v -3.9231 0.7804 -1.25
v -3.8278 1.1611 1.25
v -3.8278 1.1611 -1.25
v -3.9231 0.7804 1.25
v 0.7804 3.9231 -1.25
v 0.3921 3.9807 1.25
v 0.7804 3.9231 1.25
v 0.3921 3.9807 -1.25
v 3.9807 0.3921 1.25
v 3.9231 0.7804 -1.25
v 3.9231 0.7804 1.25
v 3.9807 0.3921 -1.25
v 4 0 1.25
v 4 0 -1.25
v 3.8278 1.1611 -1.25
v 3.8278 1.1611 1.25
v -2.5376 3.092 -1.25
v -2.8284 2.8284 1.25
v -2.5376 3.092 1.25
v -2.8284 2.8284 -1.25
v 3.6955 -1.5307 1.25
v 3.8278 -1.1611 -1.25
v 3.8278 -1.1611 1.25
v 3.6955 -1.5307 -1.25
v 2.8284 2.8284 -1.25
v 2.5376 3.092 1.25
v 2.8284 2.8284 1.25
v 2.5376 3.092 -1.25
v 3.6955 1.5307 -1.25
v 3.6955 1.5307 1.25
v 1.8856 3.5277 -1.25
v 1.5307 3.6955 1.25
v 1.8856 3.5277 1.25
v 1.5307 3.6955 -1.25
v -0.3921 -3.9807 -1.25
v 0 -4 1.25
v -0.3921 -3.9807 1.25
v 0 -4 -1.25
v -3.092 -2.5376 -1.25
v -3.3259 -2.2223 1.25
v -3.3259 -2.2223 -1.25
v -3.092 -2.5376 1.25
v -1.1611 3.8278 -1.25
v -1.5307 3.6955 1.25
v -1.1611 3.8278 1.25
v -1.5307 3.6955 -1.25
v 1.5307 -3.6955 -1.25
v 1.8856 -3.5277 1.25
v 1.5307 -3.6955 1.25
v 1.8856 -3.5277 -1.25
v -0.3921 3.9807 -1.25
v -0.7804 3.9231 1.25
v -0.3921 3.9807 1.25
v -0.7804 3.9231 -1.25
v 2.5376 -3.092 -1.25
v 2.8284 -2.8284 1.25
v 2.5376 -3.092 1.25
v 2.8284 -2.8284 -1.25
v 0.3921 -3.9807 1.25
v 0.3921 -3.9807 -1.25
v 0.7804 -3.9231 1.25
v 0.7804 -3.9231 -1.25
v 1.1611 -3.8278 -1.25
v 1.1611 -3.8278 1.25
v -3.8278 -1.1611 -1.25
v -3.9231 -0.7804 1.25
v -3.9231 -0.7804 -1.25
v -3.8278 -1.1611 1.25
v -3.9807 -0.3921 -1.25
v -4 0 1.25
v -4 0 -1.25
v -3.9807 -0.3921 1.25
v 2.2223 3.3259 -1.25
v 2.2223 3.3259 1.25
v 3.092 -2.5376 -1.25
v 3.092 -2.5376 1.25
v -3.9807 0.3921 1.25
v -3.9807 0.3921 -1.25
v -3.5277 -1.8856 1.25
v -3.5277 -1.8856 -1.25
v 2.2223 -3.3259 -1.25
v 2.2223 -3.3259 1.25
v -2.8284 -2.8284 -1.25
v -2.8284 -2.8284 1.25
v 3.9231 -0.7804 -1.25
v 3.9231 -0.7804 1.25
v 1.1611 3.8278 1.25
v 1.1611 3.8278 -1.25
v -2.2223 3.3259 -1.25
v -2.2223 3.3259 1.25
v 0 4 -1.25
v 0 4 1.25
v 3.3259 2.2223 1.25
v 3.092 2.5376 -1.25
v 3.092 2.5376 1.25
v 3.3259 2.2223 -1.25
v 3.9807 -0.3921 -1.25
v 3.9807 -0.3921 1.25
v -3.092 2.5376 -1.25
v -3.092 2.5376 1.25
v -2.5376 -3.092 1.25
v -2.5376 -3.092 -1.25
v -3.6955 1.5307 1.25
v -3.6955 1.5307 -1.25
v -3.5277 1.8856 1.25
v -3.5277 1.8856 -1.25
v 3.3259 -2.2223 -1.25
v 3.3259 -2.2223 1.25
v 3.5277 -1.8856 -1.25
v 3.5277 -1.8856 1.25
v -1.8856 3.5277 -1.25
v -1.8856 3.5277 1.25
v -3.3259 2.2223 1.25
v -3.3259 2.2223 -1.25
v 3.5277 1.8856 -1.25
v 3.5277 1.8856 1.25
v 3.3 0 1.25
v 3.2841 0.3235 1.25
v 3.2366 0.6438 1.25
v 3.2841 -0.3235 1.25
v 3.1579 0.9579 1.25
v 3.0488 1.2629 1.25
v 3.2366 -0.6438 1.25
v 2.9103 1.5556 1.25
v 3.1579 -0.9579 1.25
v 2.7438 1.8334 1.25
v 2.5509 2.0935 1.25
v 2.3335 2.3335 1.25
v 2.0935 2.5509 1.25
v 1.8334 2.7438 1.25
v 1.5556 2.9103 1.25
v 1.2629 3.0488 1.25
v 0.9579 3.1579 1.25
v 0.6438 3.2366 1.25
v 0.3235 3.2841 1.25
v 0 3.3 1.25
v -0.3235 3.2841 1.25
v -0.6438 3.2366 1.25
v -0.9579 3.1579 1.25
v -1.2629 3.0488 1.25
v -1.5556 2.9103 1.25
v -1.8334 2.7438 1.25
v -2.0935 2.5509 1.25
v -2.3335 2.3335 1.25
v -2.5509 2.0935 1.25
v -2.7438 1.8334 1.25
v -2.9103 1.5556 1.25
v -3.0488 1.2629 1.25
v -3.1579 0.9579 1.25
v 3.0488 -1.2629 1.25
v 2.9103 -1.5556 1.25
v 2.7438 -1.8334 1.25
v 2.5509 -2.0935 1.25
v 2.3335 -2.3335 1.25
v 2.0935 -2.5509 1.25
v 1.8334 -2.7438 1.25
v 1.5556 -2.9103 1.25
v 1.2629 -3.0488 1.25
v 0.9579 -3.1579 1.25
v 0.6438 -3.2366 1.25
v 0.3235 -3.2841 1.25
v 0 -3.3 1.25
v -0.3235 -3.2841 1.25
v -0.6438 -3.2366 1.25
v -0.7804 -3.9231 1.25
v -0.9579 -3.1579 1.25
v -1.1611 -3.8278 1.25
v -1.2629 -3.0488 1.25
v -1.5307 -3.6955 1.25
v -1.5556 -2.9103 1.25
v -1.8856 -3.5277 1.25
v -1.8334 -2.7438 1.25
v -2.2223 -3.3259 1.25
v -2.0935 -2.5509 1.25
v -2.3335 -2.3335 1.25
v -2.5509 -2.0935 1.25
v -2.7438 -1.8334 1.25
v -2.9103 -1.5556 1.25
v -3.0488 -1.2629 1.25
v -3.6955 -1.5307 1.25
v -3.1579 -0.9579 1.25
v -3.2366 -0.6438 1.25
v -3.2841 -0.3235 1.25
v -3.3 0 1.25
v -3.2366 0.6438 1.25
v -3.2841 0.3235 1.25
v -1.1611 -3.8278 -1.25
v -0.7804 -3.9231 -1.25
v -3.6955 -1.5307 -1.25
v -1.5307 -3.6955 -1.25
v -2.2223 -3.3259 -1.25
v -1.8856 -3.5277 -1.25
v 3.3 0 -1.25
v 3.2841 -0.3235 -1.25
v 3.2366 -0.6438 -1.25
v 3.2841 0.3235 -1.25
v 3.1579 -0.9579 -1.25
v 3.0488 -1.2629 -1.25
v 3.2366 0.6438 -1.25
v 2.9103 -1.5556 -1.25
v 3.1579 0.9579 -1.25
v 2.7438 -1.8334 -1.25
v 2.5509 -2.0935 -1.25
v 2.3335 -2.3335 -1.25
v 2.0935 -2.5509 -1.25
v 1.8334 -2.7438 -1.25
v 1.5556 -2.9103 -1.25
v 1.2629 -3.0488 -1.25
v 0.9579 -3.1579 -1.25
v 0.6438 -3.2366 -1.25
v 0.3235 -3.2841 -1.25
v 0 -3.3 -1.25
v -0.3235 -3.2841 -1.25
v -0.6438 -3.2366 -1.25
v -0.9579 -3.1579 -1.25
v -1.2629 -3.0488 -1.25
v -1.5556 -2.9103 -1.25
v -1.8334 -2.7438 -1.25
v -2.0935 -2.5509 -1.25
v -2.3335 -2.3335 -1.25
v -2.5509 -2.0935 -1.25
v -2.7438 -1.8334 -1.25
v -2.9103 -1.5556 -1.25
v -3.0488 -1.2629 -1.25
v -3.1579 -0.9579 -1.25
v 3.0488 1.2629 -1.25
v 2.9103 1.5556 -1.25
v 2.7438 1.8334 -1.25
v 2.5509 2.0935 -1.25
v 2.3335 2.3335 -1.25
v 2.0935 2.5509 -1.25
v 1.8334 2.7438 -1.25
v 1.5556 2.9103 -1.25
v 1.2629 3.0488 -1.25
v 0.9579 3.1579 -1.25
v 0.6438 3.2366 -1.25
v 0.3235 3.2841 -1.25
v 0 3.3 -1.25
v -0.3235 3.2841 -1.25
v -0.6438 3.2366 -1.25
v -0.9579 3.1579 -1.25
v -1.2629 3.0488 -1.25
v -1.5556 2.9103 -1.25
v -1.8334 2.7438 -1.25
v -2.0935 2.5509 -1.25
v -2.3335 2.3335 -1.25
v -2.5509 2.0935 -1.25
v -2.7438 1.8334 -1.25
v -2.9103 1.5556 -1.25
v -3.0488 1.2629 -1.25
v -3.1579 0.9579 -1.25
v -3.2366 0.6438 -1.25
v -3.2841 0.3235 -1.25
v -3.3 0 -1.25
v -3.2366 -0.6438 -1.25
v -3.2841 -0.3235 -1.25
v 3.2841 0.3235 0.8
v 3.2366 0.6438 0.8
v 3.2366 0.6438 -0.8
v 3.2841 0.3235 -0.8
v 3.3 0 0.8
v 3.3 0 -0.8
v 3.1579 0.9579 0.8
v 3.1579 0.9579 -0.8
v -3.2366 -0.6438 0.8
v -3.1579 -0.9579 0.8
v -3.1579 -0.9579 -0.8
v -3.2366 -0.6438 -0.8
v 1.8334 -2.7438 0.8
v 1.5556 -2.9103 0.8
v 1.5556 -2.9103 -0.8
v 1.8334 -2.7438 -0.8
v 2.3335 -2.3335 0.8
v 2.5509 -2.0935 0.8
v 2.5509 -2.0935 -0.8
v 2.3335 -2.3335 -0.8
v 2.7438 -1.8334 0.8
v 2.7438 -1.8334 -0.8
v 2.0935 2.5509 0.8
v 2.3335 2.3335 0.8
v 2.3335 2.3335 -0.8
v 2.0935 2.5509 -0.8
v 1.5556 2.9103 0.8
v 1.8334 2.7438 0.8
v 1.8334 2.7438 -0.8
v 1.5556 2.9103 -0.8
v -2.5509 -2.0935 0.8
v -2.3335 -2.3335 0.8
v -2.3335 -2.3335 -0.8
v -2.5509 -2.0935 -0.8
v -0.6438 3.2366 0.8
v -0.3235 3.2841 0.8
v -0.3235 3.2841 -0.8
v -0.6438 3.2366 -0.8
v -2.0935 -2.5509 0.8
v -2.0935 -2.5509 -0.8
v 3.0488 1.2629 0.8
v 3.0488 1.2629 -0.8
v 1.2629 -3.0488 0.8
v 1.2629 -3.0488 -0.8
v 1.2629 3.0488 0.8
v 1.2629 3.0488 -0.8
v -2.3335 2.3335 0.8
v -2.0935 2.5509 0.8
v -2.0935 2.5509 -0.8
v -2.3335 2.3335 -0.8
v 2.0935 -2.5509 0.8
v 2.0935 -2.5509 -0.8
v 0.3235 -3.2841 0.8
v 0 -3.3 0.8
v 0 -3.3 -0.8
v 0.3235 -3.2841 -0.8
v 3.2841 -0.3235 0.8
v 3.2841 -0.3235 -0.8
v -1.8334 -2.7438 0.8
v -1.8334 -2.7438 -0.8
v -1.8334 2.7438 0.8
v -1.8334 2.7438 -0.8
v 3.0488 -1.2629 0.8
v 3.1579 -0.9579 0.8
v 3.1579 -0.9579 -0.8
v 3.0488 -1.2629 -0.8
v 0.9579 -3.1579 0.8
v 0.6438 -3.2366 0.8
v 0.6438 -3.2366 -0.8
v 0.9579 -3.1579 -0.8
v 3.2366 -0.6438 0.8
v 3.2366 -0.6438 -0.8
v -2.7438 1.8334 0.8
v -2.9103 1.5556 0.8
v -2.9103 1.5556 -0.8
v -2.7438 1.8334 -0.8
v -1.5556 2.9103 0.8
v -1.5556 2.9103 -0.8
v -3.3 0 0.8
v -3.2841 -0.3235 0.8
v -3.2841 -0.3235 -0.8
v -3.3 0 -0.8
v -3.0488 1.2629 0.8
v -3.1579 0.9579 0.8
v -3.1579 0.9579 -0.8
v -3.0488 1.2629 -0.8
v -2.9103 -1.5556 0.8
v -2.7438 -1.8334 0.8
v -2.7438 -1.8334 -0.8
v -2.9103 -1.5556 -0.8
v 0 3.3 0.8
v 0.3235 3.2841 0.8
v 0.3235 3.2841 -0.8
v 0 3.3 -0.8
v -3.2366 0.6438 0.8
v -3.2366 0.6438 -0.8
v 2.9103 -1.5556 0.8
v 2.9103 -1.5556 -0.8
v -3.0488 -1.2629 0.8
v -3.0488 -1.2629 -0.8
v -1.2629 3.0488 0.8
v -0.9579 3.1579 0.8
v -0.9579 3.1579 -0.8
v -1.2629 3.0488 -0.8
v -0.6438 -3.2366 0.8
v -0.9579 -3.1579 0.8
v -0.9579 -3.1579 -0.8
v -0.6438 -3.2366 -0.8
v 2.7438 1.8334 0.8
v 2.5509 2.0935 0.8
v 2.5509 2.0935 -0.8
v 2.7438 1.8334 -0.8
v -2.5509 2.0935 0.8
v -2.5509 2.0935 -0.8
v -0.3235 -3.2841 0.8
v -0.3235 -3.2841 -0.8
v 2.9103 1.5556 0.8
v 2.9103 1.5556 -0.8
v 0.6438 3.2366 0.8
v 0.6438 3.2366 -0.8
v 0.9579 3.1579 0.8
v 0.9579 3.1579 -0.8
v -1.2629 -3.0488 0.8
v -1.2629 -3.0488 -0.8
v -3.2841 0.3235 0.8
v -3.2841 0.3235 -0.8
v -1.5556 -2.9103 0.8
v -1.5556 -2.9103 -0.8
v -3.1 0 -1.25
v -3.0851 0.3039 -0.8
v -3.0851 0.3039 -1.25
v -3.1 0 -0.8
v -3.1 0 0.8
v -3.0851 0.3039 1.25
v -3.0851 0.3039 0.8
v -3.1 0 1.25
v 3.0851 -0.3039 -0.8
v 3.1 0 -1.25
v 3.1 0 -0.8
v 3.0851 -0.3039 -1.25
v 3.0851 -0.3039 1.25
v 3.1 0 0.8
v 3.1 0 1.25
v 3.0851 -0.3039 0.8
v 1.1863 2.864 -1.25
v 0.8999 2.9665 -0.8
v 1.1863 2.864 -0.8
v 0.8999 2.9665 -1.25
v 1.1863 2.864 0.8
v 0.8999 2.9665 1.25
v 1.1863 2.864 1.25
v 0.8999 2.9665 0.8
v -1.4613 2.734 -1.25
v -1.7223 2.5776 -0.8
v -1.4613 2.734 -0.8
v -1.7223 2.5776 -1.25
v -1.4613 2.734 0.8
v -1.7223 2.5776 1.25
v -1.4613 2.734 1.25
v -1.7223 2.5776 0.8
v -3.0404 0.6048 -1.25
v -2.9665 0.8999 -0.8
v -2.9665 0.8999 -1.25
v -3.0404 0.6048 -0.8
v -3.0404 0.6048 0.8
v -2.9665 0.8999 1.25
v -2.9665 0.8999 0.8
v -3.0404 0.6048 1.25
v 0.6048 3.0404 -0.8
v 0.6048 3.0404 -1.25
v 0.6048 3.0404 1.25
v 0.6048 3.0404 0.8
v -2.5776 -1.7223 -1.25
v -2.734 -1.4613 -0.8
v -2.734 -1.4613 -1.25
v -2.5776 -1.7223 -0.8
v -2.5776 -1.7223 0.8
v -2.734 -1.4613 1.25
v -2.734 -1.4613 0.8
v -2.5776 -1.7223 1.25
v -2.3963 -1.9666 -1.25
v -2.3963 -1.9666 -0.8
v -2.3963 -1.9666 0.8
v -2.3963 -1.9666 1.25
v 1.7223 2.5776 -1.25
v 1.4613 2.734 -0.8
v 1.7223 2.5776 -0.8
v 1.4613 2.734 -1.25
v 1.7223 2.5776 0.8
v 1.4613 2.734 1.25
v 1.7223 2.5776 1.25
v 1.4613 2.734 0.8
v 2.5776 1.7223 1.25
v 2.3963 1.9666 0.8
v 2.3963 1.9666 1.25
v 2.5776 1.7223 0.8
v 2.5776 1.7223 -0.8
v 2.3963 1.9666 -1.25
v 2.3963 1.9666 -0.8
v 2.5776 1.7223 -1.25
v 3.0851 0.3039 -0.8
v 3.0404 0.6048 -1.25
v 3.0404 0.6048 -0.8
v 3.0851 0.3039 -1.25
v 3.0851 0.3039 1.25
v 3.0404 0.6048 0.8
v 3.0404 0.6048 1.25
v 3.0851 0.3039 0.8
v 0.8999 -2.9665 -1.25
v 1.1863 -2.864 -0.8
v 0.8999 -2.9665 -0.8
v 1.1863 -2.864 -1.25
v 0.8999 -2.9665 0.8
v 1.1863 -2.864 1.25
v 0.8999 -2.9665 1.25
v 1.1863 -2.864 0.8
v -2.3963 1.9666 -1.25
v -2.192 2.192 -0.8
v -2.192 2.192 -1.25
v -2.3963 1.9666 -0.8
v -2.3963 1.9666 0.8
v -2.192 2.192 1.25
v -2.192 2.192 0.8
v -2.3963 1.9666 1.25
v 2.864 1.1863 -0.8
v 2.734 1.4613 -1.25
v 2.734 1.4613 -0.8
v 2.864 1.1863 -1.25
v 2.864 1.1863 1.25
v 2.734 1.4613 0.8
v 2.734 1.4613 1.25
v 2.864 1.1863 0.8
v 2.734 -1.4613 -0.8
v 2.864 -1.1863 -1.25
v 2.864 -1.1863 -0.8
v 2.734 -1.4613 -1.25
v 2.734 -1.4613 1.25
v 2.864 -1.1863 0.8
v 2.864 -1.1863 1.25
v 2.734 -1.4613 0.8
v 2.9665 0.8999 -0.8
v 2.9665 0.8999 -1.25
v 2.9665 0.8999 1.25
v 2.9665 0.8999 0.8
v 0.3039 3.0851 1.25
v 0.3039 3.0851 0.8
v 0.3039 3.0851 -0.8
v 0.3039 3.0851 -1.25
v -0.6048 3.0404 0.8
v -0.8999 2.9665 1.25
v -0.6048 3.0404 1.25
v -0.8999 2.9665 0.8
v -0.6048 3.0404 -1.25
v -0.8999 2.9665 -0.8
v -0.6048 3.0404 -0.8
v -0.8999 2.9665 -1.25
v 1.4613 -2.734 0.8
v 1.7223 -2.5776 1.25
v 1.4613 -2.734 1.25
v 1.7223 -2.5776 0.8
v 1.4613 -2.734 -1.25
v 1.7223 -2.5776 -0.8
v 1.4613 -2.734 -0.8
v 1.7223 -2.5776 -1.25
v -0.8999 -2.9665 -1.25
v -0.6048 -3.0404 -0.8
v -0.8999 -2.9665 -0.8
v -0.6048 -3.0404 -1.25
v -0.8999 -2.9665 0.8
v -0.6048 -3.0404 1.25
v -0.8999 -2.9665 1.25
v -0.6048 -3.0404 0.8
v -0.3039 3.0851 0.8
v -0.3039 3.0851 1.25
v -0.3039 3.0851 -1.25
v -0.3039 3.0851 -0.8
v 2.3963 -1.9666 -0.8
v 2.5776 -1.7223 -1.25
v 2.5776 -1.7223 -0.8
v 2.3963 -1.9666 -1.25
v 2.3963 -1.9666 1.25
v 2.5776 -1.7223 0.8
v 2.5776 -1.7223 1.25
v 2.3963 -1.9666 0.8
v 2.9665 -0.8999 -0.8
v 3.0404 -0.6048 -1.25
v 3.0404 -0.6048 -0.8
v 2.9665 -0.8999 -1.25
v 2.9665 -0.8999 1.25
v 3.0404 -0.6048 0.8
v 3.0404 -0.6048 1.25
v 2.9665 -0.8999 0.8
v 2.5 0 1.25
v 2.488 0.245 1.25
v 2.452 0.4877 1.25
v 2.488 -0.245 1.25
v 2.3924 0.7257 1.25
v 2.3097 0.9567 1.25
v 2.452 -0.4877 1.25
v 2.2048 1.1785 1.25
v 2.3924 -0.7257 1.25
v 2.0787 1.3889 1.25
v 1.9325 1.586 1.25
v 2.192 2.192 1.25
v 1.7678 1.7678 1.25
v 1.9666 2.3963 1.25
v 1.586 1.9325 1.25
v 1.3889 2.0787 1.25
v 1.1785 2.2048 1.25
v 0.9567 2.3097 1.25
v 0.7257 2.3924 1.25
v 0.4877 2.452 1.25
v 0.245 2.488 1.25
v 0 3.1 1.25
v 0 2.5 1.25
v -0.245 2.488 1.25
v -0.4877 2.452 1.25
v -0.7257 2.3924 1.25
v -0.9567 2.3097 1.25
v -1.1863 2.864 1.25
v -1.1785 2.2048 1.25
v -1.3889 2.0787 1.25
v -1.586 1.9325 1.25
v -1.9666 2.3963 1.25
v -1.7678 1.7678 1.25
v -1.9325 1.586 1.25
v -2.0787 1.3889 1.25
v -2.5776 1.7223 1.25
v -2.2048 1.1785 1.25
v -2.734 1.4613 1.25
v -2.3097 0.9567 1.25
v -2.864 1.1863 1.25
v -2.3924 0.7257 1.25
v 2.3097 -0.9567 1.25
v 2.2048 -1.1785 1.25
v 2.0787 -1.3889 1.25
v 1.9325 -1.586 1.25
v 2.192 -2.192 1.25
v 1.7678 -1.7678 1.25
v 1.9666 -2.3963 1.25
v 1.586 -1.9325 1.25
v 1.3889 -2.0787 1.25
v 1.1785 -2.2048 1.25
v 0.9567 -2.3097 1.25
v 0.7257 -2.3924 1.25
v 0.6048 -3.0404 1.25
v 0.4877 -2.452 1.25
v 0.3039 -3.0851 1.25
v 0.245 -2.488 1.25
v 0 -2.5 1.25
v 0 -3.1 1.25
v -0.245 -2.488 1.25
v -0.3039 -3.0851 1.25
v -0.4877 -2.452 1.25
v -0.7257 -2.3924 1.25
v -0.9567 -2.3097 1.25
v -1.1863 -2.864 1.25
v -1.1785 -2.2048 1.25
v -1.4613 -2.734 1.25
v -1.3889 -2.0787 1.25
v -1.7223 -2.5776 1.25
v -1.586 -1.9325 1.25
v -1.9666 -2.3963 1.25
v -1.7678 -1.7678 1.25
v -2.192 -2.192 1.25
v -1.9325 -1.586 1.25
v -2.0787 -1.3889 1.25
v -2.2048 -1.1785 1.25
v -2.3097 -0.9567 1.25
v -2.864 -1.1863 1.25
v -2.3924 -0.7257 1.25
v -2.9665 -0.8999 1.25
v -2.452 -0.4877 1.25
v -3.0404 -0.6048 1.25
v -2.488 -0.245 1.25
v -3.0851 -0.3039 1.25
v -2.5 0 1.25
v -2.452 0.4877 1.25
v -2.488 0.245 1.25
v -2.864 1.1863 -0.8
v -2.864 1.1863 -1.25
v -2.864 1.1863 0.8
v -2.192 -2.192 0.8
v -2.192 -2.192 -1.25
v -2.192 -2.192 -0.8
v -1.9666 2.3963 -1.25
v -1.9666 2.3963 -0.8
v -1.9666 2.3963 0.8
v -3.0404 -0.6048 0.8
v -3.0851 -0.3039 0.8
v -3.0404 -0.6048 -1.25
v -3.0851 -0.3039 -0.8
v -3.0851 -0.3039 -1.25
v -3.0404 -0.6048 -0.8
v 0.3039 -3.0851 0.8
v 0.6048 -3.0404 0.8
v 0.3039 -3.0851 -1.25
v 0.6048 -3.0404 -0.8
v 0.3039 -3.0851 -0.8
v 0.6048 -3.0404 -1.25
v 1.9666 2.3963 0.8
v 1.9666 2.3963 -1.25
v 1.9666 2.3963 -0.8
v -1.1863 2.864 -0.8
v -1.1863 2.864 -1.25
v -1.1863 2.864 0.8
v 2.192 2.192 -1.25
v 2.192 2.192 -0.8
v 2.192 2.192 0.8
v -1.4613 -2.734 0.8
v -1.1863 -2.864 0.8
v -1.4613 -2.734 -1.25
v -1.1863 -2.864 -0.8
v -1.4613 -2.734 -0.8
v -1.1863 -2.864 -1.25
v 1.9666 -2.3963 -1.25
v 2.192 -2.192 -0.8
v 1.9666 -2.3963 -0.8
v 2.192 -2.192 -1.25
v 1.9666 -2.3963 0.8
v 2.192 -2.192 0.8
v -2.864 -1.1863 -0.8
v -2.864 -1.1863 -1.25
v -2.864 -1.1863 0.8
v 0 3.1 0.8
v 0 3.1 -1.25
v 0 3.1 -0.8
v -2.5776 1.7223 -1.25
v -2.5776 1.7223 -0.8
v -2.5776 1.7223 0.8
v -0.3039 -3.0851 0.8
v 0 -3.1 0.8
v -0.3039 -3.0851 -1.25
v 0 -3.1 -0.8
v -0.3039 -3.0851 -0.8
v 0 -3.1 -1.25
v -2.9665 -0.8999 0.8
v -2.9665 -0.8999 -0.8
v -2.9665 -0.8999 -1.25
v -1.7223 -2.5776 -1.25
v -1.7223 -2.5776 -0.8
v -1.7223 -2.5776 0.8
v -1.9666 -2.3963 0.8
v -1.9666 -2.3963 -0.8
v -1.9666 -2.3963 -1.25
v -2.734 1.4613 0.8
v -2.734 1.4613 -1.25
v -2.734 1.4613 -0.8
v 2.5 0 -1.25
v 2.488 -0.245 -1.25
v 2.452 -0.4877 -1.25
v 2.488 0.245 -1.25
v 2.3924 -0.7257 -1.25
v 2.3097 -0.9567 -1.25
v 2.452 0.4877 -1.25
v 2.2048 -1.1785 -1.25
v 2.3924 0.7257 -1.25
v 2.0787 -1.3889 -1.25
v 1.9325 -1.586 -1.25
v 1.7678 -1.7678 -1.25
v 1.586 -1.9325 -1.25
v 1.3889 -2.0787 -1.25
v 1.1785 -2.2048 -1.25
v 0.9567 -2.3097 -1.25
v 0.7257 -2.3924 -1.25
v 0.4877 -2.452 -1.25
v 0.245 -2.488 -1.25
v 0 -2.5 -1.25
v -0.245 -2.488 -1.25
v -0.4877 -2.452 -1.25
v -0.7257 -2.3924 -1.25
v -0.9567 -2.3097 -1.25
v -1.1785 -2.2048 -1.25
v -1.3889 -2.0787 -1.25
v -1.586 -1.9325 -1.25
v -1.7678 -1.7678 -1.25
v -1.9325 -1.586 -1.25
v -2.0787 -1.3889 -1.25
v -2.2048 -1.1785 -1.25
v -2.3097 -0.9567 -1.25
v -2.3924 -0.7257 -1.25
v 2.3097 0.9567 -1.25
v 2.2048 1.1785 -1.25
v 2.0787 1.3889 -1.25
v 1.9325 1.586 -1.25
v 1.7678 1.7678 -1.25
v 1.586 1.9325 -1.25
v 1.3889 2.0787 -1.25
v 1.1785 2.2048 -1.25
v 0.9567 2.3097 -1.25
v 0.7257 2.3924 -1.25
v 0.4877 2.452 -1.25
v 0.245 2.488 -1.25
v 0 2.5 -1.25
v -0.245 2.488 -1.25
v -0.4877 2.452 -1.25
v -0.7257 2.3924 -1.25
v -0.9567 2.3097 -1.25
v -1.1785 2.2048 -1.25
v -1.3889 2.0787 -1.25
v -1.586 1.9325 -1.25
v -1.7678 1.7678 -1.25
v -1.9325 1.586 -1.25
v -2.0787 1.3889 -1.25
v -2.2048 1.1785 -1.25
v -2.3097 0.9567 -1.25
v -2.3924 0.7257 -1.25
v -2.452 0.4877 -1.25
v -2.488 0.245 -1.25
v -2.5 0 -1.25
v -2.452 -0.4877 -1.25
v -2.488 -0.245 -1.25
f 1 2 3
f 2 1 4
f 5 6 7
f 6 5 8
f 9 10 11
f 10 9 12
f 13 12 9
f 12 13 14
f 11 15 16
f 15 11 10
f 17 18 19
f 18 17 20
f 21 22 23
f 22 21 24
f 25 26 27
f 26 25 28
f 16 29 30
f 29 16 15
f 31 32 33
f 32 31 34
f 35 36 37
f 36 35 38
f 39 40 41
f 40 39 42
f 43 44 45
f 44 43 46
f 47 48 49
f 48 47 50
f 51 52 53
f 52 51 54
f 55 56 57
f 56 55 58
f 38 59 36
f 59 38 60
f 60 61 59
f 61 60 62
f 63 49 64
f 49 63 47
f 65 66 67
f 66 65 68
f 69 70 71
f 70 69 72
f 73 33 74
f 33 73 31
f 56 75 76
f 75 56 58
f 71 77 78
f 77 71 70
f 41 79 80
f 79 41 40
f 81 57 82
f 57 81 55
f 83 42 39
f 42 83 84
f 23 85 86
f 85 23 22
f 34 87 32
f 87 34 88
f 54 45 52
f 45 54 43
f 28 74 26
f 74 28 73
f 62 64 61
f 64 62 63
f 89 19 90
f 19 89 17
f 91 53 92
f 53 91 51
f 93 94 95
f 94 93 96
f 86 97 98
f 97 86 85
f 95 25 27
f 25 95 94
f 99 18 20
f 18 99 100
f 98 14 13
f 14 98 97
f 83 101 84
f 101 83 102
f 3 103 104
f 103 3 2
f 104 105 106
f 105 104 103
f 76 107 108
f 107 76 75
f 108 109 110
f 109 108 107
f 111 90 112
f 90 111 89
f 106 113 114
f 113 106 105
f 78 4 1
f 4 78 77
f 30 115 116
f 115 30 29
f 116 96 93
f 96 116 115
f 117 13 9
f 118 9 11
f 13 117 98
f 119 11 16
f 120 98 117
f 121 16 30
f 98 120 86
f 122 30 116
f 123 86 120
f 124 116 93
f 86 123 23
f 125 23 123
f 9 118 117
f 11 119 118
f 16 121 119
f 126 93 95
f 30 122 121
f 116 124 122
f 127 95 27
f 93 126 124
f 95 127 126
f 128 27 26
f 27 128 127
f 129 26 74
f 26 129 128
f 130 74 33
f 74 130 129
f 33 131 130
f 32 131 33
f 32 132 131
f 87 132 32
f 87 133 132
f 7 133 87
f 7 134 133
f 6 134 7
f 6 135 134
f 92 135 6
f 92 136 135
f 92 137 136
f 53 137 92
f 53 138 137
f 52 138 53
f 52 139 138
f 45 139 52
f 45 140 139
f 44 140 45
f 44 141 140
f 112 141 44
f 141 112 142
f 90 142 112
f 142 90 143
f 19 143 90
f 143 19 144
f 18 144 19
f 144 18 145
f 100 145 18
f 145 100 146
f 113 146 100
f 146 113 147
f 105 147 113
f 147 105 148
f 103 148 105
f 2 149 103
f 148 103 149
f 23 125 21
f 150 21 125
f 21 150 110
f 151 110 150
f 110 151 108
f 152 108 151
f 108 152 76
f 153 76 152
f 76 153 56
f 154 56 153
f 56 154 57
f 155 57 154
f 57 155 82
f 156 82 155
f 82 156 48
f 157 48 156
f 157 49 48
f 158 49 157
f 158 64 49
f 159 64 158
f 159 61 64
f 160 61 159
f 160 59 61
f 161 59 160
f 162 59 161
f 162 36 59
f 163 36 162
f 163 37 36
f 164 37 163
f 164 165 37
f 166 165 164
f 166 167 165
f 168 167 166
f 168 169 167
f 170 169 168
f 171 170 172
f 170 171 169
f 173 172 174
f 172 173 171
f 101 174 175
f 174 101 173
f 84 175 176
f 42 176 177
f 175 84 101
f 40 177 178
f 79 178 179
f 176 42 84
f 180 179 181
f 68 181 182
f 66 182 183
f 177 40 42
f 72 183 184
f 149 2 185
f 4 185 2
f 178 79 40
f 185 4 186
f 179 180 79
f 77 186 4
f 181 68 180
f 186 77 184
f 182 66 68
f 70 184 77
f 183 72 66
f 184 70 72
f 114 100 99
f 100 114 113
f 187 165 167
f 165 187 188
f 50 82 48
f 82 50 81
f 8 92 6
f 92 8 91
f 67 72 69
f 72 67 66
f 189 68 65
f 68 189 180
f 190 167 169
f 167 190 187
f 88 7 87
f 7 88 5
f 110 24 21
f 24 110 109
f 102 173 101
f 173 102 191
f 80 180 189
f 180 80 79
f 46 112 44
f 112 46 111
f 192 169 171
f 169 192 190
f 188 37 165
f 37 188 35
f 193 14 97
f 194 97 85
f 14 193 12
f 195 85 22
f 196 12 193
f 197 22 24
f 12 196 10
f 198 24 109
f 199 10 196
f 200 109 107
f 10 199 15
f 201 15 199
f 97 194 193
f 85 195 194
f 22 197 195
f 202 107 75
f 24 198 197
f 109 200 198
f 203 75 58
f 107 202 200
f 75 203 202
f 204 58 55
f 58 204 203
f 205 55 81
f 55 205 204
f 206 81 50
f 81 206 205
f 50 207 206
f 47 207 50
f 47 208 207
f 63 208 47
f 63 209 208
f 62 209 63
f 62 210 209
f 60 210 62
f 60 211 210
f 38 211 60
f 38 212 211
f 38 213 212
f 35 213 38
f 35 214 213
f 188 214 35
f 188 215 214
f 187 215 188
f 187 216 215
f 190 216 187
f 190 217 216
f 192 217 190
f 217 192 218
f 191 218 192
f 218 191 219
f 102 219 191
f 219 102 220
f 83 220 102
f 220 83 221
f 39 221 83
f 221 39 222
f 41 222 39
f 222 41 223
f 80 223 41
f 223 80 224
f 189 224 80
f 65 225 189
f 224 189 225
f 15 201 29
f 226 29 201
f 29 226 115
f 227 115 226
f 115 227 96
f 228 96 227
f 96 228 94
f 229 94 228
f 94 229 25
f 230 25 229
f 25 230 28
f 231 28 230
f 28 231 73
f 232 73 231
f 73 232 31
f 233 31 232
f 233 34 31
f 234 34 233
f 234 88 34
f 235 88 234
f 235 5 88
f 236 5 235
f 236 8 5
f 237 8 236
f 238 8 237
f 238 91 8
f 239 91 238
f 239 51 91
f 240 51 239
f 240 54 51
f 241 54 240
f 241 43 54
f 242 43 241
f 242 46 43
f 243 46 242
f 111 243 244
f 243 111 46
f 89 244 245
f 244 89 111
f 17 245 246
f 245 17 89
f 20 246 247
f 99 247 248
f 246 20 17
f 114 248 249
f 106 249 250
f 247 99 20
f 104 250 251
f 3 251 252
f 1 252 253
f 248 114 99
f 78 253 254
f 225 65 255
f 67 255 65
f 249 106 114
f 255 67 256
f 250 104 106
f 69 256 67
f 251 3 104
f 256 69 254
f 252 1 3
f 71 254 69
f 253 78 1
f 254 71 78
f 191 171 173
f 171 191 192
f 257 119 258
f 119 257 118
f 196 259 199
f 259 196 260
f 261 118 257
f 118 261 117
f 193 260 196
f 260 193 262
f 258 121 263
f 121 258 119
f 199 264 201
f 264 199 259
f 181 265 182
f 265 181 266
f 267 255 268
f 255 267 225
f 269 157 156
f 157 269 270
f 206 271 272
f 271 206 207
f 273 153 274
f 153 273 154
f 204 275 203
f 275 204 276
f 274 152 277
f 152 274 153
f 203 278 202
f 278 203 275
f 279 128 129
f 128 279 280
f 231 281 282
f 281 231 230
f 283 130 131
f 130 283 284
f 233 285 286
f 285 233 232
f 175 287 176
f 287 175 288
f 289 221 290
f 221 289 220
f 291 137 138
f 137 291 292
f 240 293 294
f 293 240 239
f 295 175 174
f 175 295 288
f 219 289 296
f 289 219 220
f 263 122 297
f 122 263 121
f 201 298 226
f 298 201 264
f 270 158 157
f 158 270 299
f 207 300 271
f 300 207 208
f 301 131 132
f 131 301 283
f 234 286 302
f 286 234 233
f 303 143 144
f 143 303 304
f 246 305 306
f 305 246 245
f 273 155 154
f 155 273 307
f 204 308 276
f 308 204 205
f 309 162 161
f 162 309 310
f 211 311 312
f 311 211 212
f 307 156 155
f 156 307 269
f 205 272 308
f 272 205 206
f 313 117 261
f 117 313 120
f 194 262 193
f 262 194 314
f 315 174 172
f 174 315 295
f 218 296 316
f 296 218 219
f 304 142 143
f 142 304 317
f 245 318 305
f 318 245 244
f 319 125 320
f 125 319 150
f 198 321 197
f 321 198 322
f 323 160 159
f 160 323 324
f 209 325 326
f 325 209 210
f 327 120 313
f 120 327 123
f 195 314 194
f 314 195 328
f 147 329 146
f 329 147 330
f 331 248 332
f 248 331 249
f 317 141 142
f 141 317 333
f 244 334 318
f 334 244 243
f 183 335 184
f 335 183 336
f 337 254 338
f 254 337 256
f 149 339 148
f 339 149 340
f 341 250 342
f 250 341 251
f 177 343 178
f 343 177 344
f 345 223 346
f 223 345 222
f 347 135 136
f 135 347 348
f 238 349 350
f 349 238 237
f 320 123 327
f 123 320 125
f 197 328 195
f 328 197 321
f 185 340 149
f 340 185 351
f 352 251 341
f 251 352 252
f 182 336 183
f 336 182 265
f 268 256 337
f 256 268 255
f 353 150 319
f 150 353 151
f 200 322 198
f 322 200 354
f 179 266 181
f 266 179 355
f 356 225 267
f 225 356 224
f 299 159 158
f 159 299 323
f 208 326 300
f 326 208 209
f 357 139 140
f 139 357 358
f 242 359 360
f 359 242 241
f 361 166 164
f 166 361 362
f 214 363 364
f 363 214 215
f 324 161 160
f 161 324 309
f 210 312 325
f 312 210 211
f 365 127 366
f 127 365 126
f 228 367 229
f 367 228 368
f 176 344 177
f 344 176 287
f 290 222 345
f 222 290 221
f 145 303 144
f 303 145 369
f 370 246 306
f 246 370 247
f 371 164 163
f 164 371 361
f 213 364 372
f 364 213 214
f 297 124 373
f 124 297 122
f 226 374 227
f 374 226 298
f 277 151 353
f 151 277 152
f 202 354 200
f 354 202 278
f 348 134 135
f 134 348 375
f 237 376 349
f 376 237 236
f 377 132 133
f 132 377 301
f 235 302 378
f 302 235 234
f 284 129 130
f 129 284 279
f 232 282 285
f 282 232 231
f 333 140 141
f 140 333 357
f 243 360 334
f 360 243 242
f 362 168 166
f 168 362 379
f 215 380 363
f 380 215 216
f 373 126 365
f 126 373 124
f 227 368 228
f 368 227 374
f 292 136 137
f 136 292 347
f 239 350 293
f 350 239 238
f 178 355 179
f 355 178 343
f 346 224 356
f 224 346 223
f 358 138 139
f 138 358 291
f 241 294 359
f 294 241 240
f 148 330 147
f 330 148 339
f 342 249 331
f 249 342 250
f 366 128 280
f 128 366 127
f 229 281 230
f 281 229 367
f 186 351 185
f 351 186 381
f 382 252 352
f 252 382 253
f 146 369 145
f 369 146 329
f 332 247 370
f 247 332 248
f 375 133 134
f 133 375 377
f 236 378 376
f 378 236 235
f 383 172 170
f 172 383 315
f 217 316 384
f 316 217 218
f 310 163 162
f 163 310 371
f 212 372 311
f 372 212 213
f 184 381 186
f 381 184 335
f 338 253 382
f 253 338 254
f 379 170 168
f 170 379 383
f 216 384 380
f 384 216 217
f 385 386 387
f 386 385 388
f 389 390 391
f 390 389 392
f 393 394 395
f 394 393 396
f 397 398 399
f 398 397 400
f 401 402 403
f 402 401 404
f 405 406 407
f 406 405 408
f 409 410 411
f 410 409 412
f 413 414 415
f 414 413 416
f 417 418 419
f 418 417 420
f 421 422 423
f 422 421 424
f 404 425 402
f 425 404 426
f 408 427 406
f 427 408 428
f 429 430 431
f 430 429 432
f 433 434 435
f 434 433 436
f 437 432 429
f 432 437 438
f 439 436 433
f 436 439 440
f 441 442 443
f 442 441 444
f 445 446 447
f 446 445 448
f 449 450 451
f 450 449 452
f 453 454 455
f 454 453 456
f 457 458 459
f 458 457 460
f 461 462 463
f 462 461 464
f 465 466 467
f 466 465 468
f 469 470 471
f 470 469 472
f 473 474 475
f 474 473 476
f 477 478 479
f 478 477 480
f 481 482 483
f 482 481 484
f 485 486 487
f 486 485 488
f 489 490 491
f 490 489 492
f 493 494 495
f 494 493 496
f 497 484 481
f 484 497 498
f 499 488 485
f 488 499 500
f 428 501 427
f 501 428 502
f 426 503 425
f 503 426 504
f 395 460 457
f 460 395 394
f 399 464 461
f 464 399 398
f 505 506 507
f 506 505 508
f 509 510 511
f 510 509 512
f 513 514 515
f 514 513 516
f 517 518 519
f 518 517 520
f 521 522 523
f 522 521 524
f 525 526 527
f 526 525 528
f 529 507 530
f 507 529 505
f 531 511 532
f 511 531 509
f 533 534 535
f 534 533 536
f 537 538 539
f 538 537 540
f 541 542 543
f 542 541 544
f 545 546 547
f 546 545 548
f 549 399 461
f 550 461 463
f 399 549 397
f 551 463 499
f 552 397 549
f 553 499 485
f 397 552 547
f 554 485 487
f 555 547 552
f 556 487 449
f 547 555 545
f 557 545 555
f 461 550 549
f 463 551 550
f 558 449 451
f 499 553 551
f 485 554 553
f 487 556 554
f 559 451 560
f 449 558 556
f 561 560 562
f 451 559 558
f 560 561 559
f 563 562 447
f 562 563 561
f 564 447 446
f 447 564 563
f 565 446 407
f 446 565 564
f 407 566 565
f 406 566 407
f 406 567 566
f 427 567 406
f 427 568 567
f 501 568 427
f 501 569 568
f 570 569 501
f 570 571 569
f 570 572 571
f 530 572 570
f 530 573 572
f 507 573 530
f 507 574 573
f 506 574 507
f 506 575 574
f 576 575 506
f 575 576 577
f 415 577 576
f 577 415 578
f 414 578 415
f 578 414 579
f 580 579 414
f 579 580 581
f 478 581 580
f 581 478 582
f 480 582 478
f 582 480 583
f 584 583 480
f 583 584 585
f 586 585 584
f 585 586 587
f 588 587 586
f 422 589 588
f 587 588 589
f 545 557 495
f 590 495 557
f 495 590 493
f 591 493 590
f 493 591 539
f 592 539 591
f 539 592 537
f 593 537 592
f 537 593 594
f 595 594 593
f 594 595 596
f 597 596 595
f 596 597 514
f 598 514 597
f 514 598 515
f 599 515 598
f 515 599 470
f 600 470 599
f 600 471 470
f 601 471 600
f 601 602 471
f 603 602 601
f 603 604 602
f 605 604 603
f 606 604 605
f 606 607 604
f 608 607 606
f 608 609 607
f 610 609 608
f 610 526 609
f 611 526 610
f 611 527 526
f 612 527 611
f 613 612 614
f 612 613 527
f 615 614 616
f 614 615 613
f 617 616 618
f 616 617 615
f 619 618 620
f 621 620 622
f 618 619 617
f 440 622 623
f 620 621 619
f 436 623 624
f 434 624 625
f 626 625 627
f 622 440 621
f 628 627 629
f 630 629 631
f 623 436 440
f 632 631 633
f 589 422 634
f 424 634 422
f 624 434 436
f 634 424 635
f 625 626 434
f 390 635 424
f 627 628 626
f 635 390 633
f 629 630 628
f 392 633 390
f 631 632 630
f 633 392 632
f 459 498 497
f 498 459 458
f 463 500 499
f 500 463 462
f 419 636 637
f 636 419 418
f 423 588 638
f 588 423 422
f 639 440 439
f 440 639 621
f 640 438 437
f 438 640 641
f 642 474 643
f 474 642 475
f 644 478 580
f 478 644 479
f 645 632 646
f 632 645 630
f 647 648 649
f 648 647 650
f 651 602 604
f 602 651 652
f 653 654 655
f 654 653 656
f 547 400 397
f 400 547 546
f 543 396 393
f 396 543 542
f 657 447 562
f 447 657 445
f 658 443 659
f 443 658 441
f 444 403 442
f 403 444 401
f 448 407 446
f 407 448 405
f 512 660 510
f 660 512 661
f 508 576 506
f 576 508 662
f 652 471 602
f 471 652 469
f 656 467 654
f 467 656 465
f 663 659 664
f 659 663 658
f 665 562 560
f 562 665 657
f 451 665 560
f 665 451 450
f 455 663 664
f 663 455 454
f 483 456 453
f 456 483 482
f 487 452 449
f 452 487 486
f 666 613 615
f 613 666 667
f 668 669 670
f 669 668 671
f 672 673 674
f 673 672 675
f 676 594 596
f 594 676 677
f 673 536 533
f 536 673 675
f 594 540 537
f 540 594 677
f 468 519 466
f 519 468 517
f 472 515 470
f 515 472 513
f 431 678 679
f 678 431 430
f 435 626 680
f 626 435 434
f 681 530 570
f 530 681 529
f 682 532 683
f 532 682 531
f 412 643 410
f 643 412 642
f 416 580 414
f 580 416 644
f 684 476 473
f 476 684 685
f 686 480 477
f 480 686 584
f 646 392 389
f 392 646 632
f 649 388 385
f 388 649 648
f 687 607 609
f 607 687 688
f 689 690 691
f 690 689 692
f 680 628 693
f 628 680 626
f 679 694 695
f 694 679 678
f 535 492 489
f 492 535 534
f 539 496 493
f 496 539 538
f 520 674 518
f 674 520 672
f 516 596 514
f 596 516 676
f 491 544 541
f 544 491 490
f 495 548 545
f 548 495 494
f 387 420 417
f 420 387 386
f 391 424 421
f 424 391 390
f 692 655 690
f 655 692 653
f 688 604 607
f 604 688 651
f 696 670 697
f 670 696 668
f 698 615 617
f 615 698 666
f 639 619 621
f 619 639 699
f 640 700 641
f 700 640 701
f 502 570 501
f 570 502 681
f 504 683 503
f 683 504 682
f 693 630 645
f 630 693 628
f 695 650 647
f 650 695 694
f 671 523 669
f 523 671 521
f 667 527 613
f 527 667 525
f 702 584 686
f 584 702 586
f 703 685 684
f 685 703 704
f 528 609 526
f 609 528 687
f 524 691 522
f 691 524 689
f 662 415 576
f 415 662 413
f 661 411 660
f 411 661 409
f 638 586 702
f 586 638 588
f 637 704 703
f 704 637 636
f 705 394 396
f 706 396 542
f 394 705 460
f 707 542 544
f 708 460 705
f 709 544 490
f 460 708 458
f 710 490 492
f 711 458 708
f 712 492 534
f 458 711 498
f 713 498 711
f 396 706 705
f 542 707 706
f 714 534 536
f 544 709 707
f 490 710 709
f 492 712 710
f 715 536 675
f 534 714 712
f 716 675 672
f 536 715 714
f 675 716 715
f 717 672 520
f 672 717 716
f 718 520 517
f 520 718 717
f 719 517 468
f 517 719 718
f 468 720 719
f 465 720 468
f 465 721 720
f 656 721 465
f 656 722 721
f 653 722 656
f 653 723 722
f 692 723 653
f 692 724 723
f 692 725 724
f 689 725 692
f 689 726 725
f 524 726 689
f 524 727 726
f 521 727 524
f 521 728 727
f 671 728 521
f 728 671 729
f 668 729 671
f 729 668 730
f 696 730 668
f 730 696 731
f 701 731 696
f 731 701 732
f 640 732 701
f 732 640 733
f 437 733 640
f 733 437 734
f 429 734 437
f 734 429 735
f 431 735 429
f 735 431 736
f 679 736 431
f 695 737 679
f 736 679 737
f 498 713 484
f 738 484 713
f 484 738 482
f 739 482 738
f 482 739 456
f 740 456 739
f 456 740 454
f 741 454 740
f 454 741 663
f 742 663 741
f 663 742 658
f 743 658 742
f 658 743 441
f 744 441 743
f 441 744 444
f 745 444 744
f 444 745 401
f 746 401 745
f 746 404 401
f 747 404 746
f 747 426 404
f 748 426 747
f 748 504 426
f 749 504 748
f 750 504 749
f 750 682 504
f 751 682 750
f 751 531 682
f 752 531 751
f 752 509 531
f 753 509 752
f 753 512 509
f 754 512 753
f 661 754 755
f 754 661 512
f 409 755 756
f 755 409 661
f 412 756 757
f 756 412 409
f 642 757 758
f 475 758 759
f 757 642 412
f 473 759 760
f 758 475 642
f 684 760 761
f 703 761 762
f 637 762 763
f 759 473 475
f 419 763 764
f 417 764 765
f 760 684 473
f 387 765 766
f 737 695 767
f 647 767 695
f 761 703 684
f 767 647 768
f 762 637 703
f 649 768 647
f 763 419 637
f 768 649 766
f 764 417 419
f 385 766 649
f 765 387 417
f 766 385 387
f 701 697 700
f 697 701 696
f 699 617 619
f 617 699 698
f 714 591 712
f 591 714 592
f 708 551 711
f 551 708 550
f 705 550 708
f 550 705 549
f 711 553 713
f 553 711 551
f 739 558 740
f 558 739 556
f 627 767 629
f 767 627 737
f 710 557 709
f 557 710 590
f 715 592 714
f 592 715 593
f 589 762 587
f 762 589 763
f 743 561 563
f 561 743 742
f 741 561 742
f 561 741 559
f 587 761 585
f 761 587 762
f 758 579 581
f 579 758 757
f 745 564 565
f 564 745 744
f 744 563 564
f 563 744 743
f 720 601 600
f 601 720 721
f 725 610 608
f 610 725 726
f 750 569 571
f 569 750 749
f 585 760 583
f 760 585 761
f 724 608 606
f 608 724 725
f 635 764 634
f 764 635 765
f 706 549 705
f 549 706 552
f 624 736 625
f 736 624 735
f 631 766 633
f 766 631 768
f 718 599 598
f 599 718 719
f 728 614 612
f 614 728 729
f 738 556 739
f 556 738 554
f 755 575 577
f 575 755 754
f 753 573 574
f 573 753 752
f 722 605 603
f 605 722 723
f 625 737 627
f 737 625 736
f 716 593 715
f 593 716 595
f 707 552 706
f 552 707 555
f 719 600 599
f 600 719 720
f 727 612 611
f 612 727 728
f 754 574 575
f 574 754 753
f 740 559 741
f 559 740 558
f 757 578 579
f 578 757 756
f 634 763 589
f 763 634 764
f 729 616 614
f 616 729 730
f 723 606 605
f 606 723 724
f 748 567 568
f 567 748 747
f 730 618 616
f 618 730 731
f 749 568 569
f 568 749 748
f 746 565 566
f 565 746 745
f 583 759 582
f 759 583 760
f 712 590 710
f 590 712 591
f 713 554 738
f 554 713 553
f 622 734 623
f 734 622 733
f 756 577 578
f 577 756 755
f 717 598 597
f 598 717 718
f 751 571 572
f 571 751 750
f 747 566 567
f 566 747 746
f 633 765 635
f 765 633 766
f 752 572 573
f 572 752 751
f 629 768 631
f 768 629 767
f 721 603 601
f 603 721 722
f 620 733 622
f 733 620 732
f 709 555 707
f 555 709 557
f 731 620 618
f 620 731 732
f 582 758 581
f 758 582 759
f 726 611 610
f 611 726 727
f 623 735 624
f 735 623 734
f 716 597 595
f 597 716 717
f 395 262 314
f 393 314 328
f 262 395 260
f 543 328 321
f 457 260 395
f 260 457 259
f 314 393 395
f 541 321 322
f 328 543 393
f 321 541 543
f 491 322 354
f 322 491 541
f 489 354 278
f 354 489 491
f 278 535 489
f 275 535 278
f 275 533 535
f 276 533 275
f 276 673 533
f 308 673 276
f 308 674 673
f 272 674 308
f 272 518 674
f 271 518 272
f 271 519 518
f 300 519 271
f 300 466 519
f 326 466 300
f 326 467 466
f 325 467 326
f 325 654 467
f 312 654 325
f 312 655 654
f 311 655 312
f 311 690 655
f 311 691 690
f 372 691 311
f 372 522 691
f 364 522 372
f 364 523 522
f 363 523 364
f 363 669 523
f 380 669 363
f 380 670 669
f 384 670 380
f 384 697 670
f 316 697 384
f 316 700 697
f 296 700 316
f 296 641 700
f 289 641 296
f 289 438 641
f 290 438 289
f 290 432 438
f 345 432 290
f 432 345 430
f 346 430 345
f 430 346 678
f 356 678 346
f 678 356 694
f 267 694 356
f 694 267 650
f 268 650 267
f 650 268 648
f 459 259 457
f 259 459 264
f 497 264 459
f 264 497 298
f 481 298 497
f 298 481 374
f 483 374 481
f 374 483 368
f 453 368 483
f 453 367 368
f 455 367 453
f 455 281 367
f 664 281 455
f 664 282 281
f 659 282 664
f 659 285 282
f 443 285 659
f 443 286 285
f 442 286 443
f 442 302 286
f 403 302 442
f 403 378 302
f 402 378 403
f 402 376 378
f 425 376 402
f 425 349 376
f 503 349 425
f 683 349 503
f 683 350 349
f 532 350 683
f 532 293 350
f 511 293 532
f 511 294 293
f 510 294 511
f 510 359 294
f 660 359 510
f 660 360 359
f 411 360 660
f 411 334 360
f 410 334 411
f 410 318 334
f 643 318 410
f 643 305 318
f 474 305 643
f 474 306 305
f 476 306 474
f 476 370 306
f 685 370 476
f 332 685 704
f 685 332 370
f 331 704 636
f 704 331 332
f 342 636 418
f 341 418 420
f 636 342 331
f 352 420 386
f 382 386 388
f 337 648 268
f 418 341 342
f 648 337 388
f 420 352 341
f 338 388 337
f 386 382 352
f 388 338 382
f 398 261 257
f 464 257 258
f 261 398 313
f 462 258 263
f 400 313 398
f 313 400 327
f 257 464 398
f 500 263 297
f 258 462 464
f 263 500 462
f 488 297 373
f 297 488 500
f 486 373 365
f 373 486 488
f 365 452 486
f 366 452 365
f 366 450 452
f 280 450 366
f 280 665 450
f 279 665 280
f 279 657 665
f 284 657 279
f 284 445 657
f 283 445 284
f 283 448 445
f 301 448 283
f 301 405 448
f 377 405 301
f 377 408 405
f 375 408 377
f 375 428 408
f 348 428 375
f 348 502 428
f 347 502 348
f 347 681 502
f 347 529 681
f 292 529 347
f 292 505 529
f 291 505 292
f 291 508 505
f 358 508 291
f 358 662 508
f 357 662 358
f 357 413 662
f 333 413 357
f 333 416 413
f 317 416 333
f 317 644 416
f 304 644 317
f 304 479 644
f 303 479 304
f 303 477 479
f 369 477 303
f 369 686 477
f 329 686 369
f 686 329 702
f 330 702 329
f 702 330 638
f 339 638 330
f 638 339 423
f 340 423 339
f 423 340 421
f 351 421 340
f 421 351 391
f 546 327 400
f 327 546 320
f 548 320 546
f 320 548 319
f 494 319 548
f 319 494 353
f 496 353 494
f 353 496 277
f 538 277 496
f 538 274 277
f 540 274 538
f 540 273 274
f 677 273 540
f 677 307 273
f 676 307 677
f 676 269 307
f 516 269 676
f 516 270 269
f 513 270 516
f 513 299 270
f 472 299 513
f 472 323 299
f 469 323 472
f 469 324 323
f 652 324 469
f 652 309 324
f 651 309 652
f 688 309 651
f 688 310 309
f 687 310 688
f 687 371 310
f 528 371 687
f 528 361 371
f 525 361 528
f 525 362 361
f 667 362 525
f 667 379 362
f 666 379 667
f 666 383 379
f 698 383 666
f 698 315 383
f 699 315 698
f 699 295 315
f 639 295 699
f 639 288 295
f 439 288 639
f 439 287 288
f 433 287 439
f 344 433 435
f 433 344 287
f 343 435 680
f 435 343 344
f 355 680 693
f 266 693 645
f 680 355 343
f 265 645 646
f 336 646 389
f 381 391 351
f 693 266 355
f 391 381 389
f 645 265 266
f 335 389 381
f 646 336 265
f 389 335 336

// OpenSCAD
// Parameters
bore_diameter_mm = 5.0; //[2.5:10.0:0.1]
outer_diameter_mm = 8.0; //[4.0:16.0:0.1]
width_mm = 2.5; //[1.25:5.0:0.05]
bore_radius_mm = 2.5; //[1.25:5.0:0.05]
outer_radius_mm = 4.0; //[2.0:8.0:0.05]
eps_mm = 0.6; //[0.2:1.5:0.1]
race_rim_mm = 0.7; //[0.35:1.4:0.05]
race_hub_mm = 0.6; //[0.3:1.2:0.05]
shield_thickness_mm = 0.4; //[0.2:0.8:0.05]
shield_width_mm = 1.6; //[0.8:3.2:0.05]
ball_diameter_mm = 0.9; //[0.5:1.6:0.05]
ball_count = 8; //[5:14:1]

// Bearing Ball - complete geometry
module bearing_ball() {
  color("Silver") {
    sphere(r=ball_diameter_mm/2, $fn=32);
  }
}

// Ball Bearing - complete geometry
module ball_bearing() {
  color("DimGray") {
    // Outer Race
    difference() {
      cylinder(r=outer_diameter_mm/2, h=width_mm, center=true, $fn=64);
      cylinder(r=outer_diameter_mm/2 - race_rim_mm, h=width_mm + 2*eps_mm, center=true, $fn=64);
    }
    // Inner Race
    difference() {
      cylinder(r=bore_diameter_mm/2 + race_hub_mm, h=width_mm, center=true, $fn=64);
      cylinder(r=bore_diameter_mm/2, h=width_mm + 2*eps_mm, center=true, $fn=64);
    }
    // Shield or Seal Ring
    difference() {
      cylinder(r=outer_diameter_mm/2 - race_rim_mm + eps_mm, h=shield_width_mm, center=true, $fn=64);
      cylinder(r=bore_diameter_mm/2 + race_hub_mm - eps_mm, h=shield_width_mm + 2*eps_mm, center=true, $fn=64);
    }
    // Bearing Balls
    for (i = [0:ball_count-1]) {
      rotate([0, 0, i*360/ball_count]) 
      translate([(bore_diameter_mm/2 + race_hub_mm + (outer_diameter_mm/2 - race_rim_mm))/2, 0, 0]) 
      bearing_ball();
    }
  }
}

// Assembly
module assembly() {
  ball_bearing();
}

assembly();
